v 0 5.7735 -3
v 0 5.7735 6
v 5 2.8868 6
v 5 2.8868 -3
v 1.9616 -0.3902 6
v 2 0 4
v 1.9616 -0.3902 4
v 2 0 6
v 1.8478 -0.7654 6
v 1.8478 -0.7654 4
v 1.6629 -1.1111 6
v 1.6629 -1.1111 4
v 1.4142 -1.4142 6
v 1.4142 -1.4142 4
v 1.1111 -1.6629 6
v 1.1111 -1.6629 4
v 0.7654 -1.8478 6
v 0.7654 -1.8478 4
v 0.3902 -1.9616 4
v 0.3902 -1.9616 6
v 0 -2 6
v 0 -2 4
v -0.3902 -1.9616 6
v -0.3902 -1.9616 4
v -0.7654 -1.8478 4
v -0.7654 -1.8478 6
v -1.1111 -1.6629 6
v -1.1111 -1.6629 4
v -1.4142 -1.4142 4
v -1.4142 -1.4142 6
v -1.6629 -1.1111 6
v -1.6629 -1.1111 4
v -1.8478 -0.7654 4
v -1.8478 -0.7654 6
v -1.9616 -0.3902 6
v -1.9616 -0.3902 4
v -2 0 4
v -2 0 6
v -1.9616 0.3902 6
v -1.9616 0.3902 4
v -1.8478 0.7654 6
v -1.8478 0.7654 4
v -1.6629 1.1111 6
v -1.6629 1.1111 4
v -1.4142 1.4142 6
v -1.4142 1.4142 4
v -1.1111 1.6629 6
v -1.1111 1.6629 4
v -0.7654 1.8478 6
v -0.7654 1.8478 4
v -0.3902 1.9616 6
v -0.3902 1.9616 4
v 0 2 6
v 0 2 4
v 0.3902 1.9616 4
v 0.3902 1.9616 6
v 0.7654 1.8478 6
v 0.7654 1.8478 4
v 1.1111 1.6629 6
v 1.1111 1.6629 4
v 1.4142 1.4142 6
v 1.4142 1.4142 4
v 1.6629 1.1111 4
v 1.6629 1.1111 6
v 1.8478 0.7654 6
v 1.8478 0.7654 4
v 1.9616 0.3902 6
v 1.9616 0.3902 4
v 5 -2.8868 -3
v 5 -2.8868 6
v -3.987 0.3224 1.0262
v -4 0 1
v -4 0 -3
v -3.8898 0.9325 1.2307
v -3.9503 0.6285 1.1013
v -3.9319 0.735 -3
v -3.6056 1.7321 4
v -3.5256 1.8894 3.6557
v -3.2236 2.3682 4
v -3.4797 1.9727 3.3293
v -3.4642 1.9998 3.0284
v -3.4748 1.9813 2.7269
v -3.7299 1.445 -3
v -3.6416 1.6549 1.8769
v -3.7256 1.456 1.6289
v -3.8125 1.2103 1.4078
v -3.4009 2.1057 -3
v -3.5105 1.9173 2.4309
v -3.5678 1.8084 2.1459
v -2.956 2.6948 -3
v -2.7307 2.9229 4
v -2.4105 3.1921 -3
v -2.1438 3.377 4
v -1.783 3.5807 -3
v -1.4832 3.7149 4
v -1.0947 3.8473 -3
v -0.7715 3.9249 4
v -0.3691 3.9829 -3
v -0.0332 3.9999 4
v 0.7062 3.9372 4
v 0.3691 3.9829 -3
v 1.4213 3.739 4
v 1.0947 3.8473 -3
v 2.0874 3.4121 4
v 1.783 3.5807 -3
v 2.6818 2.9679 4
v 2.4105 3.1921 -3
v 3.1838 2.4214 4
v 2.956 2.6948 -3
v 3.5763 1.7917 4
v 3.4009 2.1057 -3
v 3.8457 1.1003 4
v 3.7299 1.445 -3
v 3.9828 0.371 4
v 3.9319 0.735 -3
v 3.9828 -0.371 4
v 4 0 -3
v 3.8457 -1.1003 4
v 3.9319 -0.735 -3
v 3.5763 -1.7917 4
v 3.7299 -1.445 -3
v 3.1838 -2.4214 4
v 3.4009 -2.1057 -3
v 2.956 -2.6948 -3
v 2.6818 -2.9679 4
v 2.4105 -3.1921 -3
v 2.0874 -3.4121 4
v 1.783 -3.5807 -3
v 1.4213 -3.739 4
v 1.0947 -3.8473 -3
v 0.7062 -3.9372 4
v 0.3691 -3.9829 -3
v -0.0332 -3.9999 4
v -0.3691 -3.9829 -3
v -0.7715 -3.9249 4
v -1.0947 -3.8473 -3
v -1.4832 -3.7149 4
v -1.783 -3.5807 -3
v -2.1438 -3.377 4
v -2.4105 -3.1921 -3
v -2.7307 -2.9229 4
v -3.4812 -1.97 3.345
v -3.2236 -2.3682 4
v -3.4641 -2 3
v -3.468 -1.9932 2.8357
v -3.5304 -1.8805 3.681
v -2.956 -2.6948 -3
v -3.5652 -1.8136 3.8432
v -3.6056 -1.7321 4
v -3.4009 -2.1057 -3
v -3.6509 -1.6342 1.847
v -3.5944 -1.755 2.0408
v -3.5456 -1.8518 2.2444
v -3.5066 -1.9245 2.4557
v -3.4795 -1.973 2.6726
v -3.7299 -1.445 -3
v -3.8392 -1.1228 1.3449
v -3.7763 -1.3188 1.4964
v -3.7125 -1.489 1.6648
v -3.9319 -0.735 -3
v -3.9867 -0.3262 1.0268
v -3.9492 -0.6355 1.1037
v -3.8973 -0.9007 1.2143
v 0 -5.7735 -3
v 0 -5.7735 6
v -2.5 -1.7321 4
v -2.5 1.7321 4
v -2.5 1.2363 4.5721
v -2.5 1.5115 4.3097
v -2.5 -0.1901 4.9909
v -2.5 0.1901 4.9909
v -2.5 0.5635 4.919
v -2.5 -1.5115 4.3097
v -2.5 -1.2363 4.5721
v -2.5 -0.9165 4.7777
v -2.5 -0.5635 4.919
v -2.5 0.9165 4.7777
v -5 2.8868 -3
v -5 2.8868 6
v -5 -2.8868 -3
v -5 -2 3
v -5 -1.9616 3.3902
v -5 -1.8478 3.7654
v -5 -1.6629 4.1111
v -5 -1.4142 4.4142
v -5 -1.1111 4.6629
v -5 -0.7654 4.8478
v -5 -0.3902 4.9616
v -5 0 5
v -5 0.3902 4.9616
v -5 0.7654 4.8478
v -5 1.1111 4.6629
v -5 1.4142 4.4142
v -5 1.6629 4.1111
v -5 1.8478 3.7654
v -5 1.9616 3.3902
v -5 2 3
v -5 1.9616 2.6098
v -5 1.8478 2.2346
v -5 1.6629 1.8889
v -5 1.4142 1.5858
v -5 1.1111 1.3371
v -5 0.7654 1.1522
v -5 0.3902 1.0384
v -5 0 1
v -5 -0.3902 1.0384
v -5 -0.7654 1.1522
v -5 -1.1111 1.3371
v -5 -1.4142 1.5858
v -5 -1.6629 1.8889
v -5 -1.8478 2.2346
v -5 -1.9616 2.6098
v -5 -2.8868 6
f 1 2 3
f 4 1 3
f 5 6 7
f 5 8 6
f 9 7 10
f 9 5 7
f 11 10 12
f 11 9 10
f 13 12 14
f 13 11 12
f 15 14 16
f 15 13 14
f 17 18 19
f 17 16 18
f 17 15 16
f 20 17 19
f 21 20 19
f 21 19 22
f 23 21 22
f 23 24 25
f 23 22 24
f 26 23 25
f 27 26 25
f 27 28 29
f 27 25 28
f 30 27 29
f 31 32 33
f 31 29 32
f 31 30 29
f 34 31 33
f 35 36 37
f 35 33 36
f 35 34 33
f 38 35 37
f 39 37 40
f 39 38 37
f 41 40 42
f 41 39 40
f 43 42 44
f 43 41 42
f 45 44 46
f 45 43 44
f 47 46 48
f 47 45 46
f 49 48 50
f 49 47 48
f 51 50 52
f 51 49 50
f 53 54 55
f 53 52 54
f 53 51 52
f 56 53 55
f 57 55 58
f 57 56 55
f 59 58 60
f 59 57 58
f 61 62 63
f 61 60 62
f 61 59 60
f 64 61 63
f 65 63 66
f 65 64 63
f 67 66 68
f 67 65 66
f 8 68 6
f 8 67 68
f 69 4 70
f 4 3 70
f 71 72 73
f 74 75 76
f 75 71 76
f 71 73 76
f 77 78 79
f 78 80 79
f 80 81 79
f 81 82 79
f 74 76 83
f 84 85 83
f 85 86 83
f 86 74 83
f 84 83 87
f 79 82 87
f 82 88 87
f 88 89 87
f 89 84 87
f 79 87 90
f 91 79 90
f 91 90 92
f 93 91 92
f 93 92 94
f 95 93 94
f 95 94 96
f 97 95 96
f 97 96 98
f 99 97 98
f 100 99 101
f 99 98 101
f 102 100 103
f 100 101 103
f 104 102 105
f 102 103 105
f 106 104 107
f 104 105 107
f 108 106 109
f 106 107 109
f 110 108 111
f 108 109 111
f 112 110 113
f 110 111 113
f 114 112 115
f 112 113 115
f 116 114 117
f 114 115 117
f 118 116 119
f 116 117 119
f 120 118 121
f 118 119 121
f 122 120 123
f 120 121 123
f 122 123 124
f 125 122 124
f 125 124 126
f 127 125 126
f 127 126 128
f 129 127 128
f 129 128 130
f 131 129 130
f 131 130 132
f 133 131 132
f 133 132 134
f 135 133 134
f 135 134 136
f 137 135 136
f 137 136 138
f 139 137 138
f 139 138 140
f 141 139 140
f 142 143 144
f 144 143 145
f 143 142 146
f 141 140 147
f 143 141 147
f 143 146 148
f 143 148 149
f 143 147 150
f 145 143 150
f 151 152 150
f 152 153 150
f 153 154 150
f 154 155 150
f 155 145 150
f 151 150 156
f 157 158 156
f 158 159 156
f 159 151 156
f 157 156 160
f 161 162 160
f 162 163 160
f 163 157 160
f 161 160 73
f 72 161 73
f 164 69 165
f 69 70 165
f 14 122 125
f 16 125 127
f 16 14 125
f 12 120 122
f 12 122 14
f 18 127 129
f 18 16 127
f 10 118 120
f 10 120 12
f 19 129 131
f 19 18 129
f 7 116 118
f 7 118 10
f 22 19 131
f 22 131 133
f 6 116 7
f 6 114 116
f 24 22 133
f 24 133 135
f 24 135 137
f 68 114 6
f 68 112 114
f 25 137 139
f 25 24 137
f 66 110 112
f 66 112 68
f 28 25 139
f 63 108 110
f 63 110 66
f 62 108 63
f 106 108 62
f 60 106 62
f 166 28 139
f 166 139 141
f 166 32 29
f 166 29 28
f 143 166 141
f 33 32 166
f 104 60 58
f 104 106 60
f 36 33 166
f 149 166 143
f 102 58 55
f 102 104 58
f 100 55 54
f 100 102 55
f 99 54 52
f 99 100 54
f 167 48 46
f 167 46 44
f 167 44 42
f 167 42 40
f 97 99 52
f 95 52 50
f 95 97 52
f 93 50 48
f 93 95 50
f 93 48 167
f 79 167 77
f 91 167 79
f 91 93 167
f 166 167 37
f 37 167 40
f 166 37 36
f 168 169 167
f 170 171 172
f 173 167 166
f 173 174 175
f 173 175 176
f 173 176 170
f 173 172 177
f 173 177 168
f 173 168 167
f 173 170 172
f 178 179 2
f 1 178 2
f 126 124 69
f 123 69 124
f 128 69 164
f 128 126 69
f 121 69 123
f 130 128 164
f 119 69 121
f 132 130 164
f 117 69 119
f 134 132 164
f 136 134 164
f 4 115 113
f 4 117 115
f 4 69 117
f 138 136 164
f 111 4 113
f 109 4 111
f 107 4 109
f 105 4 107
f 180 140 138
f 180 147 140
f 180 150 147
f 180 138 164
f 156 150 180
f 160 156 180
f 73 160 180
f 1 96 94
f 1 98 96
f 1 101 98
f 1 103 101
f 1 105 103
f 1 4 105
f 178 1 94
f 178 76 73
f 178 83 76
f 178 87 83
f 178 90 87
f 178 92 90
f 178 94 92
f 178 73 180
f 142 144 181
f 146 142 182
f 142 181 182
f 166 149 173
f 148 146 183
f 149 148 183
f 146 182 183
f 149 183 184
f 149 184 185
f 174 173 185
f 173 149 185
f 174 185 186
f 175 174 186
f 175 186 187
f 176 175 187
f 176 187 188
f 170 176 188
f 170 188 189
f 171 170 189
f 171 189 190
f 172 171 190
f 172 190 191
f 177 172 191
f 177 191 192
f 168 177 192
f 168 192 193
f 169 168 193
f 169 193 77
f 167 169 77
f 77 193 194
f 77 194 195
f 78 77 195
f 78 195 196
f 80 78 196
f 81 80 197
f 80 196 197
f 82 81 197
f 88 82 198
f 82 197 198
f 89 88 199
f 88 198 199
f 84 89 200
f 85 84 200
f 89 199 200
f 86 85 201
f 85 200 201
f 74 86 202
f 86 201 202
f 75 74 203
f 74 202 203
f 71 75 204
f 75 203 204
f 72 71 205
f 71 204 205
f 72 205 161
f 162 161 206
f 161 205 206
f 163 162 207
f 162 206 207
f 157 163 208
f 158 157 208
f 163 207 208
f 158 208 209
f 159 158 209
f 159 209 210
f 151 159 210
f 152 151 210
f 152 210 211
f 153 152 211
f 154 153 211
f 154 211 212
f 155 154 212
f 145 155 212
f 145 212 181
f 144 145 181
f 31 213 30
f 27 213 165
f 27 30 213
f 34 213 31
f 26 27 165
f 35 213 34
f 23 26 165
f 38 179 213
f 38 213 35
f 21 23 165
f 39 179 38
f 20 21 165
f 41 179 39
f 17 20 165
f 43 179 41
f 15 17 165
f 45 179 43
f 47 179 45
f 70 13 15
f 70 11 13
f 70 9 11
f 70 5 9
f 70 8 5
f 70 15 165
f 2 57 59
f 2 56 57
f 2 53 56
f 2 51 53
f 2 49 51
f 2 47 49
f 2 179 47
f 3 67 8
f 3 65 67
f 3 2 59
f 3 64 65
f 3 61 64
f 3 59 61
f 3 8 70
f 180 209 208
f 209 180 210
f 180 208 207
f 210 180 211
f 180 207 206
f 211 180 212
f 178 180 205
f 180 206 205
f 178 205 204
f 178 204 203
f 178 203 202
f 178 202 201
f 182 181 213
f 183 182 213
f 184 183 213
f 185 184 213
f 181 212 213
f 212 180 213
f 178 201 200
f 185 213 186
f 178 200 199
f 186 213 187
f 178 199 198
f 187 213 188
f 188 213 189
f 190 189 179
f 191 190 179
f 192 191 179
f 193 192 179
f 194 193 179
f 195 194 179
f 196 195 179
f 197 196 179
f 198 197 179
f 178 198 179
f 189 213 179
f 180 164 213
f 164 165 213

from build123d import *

# Parameters (mm, degrees)
BOSS_EXTRUDE1_DEPTH = 6
SKETCH3_R           = 2
CUT_EXTRUDE1_DEPTH  = 2.5
CUT_EXTRUDE5_REACH  = 11.713
SKETCH5_R           = 2
SKETCH6_R           = 2
BOSS_EXTRUDE2_DEPTH = 3
SKETCH7_R           = 4
CUT_EXTRUDE6_DEPTH  = 7


with BuildPart() as part:
    # Sketch2 → Boss-Extrude1 (new body)
    with BuildSketch(Plane.XY):
        Polygon((0, -5.773502692), (5, -2.886751346), (5, 2.886751346), (0, 5.773502692), (-5, 2.886751346), (-5, -2.886751346), align=None)
    extrude(amount=BOSS_EXTRUDE1_DEPTH)

    # Sketch3 → Cut-Extrude1 (cut)
    with BuildSketch(Plane.ZY.offset(5)):
        with Locations(Location((3, 0, 0), (0, 0, 270))):
            Circle(SKETCH3_R)
    extrude(amount=-CUT_EXTRUDE1_DEPTH, mode=Mode.SUBTRACT)

    # Sketch5 → Cut-Extrude5 (cut, up to next)
    with BuildSketch(Plane.XY.offset(6), mode=Mode.PRIVATE) as cut_extrude5_sk1:
        Circle(SKETCH5_R)
    cut_extrude5_tool1 = extrude(cut_extrude5_sk1.sketch, amount=-CUT_EXTRUDE5_REACH, mode=Mode.PRIVATE) & part.part
    add(cut_extrude5_tool1.solids().sort_by_distance((0, 0, 6))[0], mode=Mode.SUBTRACT)

    # Sketch6 → Boss-Extrude2 (add)
    with BuildSketch(Plane(origin=(0, 0, 0), x_dir=(-1, 0, 0), z_dir=(0, 0, -1))):
        Polygon((0, 5.773502692), (-5, 2.886751346), (-5, -2.886751346), (0, -5.773502692), (5, -2.886751346), (5, 2.886751346), align=None)
        with Locations(Location((0, 0, 0), (0, 0, 180))):
            Circle(SKETCH6_R, mode=Mode.SUBTRACT)
    extrude(amount=BOSS_EXTRUDE2_DEPTH)

    # Sketch7 → Cut-Extrude6 (cut)
    with BuildSketch(Plane(origin=(0, 0, -3), x_dir=(-1, 0, 0), z_dir=(0, 0, -1))):
        Circle(SKETCH7_R)
    extrude(amount=-CUT_EXTRUDE6_DEPTH, mode=Mode.SUBTRACT)


solid = part.part
